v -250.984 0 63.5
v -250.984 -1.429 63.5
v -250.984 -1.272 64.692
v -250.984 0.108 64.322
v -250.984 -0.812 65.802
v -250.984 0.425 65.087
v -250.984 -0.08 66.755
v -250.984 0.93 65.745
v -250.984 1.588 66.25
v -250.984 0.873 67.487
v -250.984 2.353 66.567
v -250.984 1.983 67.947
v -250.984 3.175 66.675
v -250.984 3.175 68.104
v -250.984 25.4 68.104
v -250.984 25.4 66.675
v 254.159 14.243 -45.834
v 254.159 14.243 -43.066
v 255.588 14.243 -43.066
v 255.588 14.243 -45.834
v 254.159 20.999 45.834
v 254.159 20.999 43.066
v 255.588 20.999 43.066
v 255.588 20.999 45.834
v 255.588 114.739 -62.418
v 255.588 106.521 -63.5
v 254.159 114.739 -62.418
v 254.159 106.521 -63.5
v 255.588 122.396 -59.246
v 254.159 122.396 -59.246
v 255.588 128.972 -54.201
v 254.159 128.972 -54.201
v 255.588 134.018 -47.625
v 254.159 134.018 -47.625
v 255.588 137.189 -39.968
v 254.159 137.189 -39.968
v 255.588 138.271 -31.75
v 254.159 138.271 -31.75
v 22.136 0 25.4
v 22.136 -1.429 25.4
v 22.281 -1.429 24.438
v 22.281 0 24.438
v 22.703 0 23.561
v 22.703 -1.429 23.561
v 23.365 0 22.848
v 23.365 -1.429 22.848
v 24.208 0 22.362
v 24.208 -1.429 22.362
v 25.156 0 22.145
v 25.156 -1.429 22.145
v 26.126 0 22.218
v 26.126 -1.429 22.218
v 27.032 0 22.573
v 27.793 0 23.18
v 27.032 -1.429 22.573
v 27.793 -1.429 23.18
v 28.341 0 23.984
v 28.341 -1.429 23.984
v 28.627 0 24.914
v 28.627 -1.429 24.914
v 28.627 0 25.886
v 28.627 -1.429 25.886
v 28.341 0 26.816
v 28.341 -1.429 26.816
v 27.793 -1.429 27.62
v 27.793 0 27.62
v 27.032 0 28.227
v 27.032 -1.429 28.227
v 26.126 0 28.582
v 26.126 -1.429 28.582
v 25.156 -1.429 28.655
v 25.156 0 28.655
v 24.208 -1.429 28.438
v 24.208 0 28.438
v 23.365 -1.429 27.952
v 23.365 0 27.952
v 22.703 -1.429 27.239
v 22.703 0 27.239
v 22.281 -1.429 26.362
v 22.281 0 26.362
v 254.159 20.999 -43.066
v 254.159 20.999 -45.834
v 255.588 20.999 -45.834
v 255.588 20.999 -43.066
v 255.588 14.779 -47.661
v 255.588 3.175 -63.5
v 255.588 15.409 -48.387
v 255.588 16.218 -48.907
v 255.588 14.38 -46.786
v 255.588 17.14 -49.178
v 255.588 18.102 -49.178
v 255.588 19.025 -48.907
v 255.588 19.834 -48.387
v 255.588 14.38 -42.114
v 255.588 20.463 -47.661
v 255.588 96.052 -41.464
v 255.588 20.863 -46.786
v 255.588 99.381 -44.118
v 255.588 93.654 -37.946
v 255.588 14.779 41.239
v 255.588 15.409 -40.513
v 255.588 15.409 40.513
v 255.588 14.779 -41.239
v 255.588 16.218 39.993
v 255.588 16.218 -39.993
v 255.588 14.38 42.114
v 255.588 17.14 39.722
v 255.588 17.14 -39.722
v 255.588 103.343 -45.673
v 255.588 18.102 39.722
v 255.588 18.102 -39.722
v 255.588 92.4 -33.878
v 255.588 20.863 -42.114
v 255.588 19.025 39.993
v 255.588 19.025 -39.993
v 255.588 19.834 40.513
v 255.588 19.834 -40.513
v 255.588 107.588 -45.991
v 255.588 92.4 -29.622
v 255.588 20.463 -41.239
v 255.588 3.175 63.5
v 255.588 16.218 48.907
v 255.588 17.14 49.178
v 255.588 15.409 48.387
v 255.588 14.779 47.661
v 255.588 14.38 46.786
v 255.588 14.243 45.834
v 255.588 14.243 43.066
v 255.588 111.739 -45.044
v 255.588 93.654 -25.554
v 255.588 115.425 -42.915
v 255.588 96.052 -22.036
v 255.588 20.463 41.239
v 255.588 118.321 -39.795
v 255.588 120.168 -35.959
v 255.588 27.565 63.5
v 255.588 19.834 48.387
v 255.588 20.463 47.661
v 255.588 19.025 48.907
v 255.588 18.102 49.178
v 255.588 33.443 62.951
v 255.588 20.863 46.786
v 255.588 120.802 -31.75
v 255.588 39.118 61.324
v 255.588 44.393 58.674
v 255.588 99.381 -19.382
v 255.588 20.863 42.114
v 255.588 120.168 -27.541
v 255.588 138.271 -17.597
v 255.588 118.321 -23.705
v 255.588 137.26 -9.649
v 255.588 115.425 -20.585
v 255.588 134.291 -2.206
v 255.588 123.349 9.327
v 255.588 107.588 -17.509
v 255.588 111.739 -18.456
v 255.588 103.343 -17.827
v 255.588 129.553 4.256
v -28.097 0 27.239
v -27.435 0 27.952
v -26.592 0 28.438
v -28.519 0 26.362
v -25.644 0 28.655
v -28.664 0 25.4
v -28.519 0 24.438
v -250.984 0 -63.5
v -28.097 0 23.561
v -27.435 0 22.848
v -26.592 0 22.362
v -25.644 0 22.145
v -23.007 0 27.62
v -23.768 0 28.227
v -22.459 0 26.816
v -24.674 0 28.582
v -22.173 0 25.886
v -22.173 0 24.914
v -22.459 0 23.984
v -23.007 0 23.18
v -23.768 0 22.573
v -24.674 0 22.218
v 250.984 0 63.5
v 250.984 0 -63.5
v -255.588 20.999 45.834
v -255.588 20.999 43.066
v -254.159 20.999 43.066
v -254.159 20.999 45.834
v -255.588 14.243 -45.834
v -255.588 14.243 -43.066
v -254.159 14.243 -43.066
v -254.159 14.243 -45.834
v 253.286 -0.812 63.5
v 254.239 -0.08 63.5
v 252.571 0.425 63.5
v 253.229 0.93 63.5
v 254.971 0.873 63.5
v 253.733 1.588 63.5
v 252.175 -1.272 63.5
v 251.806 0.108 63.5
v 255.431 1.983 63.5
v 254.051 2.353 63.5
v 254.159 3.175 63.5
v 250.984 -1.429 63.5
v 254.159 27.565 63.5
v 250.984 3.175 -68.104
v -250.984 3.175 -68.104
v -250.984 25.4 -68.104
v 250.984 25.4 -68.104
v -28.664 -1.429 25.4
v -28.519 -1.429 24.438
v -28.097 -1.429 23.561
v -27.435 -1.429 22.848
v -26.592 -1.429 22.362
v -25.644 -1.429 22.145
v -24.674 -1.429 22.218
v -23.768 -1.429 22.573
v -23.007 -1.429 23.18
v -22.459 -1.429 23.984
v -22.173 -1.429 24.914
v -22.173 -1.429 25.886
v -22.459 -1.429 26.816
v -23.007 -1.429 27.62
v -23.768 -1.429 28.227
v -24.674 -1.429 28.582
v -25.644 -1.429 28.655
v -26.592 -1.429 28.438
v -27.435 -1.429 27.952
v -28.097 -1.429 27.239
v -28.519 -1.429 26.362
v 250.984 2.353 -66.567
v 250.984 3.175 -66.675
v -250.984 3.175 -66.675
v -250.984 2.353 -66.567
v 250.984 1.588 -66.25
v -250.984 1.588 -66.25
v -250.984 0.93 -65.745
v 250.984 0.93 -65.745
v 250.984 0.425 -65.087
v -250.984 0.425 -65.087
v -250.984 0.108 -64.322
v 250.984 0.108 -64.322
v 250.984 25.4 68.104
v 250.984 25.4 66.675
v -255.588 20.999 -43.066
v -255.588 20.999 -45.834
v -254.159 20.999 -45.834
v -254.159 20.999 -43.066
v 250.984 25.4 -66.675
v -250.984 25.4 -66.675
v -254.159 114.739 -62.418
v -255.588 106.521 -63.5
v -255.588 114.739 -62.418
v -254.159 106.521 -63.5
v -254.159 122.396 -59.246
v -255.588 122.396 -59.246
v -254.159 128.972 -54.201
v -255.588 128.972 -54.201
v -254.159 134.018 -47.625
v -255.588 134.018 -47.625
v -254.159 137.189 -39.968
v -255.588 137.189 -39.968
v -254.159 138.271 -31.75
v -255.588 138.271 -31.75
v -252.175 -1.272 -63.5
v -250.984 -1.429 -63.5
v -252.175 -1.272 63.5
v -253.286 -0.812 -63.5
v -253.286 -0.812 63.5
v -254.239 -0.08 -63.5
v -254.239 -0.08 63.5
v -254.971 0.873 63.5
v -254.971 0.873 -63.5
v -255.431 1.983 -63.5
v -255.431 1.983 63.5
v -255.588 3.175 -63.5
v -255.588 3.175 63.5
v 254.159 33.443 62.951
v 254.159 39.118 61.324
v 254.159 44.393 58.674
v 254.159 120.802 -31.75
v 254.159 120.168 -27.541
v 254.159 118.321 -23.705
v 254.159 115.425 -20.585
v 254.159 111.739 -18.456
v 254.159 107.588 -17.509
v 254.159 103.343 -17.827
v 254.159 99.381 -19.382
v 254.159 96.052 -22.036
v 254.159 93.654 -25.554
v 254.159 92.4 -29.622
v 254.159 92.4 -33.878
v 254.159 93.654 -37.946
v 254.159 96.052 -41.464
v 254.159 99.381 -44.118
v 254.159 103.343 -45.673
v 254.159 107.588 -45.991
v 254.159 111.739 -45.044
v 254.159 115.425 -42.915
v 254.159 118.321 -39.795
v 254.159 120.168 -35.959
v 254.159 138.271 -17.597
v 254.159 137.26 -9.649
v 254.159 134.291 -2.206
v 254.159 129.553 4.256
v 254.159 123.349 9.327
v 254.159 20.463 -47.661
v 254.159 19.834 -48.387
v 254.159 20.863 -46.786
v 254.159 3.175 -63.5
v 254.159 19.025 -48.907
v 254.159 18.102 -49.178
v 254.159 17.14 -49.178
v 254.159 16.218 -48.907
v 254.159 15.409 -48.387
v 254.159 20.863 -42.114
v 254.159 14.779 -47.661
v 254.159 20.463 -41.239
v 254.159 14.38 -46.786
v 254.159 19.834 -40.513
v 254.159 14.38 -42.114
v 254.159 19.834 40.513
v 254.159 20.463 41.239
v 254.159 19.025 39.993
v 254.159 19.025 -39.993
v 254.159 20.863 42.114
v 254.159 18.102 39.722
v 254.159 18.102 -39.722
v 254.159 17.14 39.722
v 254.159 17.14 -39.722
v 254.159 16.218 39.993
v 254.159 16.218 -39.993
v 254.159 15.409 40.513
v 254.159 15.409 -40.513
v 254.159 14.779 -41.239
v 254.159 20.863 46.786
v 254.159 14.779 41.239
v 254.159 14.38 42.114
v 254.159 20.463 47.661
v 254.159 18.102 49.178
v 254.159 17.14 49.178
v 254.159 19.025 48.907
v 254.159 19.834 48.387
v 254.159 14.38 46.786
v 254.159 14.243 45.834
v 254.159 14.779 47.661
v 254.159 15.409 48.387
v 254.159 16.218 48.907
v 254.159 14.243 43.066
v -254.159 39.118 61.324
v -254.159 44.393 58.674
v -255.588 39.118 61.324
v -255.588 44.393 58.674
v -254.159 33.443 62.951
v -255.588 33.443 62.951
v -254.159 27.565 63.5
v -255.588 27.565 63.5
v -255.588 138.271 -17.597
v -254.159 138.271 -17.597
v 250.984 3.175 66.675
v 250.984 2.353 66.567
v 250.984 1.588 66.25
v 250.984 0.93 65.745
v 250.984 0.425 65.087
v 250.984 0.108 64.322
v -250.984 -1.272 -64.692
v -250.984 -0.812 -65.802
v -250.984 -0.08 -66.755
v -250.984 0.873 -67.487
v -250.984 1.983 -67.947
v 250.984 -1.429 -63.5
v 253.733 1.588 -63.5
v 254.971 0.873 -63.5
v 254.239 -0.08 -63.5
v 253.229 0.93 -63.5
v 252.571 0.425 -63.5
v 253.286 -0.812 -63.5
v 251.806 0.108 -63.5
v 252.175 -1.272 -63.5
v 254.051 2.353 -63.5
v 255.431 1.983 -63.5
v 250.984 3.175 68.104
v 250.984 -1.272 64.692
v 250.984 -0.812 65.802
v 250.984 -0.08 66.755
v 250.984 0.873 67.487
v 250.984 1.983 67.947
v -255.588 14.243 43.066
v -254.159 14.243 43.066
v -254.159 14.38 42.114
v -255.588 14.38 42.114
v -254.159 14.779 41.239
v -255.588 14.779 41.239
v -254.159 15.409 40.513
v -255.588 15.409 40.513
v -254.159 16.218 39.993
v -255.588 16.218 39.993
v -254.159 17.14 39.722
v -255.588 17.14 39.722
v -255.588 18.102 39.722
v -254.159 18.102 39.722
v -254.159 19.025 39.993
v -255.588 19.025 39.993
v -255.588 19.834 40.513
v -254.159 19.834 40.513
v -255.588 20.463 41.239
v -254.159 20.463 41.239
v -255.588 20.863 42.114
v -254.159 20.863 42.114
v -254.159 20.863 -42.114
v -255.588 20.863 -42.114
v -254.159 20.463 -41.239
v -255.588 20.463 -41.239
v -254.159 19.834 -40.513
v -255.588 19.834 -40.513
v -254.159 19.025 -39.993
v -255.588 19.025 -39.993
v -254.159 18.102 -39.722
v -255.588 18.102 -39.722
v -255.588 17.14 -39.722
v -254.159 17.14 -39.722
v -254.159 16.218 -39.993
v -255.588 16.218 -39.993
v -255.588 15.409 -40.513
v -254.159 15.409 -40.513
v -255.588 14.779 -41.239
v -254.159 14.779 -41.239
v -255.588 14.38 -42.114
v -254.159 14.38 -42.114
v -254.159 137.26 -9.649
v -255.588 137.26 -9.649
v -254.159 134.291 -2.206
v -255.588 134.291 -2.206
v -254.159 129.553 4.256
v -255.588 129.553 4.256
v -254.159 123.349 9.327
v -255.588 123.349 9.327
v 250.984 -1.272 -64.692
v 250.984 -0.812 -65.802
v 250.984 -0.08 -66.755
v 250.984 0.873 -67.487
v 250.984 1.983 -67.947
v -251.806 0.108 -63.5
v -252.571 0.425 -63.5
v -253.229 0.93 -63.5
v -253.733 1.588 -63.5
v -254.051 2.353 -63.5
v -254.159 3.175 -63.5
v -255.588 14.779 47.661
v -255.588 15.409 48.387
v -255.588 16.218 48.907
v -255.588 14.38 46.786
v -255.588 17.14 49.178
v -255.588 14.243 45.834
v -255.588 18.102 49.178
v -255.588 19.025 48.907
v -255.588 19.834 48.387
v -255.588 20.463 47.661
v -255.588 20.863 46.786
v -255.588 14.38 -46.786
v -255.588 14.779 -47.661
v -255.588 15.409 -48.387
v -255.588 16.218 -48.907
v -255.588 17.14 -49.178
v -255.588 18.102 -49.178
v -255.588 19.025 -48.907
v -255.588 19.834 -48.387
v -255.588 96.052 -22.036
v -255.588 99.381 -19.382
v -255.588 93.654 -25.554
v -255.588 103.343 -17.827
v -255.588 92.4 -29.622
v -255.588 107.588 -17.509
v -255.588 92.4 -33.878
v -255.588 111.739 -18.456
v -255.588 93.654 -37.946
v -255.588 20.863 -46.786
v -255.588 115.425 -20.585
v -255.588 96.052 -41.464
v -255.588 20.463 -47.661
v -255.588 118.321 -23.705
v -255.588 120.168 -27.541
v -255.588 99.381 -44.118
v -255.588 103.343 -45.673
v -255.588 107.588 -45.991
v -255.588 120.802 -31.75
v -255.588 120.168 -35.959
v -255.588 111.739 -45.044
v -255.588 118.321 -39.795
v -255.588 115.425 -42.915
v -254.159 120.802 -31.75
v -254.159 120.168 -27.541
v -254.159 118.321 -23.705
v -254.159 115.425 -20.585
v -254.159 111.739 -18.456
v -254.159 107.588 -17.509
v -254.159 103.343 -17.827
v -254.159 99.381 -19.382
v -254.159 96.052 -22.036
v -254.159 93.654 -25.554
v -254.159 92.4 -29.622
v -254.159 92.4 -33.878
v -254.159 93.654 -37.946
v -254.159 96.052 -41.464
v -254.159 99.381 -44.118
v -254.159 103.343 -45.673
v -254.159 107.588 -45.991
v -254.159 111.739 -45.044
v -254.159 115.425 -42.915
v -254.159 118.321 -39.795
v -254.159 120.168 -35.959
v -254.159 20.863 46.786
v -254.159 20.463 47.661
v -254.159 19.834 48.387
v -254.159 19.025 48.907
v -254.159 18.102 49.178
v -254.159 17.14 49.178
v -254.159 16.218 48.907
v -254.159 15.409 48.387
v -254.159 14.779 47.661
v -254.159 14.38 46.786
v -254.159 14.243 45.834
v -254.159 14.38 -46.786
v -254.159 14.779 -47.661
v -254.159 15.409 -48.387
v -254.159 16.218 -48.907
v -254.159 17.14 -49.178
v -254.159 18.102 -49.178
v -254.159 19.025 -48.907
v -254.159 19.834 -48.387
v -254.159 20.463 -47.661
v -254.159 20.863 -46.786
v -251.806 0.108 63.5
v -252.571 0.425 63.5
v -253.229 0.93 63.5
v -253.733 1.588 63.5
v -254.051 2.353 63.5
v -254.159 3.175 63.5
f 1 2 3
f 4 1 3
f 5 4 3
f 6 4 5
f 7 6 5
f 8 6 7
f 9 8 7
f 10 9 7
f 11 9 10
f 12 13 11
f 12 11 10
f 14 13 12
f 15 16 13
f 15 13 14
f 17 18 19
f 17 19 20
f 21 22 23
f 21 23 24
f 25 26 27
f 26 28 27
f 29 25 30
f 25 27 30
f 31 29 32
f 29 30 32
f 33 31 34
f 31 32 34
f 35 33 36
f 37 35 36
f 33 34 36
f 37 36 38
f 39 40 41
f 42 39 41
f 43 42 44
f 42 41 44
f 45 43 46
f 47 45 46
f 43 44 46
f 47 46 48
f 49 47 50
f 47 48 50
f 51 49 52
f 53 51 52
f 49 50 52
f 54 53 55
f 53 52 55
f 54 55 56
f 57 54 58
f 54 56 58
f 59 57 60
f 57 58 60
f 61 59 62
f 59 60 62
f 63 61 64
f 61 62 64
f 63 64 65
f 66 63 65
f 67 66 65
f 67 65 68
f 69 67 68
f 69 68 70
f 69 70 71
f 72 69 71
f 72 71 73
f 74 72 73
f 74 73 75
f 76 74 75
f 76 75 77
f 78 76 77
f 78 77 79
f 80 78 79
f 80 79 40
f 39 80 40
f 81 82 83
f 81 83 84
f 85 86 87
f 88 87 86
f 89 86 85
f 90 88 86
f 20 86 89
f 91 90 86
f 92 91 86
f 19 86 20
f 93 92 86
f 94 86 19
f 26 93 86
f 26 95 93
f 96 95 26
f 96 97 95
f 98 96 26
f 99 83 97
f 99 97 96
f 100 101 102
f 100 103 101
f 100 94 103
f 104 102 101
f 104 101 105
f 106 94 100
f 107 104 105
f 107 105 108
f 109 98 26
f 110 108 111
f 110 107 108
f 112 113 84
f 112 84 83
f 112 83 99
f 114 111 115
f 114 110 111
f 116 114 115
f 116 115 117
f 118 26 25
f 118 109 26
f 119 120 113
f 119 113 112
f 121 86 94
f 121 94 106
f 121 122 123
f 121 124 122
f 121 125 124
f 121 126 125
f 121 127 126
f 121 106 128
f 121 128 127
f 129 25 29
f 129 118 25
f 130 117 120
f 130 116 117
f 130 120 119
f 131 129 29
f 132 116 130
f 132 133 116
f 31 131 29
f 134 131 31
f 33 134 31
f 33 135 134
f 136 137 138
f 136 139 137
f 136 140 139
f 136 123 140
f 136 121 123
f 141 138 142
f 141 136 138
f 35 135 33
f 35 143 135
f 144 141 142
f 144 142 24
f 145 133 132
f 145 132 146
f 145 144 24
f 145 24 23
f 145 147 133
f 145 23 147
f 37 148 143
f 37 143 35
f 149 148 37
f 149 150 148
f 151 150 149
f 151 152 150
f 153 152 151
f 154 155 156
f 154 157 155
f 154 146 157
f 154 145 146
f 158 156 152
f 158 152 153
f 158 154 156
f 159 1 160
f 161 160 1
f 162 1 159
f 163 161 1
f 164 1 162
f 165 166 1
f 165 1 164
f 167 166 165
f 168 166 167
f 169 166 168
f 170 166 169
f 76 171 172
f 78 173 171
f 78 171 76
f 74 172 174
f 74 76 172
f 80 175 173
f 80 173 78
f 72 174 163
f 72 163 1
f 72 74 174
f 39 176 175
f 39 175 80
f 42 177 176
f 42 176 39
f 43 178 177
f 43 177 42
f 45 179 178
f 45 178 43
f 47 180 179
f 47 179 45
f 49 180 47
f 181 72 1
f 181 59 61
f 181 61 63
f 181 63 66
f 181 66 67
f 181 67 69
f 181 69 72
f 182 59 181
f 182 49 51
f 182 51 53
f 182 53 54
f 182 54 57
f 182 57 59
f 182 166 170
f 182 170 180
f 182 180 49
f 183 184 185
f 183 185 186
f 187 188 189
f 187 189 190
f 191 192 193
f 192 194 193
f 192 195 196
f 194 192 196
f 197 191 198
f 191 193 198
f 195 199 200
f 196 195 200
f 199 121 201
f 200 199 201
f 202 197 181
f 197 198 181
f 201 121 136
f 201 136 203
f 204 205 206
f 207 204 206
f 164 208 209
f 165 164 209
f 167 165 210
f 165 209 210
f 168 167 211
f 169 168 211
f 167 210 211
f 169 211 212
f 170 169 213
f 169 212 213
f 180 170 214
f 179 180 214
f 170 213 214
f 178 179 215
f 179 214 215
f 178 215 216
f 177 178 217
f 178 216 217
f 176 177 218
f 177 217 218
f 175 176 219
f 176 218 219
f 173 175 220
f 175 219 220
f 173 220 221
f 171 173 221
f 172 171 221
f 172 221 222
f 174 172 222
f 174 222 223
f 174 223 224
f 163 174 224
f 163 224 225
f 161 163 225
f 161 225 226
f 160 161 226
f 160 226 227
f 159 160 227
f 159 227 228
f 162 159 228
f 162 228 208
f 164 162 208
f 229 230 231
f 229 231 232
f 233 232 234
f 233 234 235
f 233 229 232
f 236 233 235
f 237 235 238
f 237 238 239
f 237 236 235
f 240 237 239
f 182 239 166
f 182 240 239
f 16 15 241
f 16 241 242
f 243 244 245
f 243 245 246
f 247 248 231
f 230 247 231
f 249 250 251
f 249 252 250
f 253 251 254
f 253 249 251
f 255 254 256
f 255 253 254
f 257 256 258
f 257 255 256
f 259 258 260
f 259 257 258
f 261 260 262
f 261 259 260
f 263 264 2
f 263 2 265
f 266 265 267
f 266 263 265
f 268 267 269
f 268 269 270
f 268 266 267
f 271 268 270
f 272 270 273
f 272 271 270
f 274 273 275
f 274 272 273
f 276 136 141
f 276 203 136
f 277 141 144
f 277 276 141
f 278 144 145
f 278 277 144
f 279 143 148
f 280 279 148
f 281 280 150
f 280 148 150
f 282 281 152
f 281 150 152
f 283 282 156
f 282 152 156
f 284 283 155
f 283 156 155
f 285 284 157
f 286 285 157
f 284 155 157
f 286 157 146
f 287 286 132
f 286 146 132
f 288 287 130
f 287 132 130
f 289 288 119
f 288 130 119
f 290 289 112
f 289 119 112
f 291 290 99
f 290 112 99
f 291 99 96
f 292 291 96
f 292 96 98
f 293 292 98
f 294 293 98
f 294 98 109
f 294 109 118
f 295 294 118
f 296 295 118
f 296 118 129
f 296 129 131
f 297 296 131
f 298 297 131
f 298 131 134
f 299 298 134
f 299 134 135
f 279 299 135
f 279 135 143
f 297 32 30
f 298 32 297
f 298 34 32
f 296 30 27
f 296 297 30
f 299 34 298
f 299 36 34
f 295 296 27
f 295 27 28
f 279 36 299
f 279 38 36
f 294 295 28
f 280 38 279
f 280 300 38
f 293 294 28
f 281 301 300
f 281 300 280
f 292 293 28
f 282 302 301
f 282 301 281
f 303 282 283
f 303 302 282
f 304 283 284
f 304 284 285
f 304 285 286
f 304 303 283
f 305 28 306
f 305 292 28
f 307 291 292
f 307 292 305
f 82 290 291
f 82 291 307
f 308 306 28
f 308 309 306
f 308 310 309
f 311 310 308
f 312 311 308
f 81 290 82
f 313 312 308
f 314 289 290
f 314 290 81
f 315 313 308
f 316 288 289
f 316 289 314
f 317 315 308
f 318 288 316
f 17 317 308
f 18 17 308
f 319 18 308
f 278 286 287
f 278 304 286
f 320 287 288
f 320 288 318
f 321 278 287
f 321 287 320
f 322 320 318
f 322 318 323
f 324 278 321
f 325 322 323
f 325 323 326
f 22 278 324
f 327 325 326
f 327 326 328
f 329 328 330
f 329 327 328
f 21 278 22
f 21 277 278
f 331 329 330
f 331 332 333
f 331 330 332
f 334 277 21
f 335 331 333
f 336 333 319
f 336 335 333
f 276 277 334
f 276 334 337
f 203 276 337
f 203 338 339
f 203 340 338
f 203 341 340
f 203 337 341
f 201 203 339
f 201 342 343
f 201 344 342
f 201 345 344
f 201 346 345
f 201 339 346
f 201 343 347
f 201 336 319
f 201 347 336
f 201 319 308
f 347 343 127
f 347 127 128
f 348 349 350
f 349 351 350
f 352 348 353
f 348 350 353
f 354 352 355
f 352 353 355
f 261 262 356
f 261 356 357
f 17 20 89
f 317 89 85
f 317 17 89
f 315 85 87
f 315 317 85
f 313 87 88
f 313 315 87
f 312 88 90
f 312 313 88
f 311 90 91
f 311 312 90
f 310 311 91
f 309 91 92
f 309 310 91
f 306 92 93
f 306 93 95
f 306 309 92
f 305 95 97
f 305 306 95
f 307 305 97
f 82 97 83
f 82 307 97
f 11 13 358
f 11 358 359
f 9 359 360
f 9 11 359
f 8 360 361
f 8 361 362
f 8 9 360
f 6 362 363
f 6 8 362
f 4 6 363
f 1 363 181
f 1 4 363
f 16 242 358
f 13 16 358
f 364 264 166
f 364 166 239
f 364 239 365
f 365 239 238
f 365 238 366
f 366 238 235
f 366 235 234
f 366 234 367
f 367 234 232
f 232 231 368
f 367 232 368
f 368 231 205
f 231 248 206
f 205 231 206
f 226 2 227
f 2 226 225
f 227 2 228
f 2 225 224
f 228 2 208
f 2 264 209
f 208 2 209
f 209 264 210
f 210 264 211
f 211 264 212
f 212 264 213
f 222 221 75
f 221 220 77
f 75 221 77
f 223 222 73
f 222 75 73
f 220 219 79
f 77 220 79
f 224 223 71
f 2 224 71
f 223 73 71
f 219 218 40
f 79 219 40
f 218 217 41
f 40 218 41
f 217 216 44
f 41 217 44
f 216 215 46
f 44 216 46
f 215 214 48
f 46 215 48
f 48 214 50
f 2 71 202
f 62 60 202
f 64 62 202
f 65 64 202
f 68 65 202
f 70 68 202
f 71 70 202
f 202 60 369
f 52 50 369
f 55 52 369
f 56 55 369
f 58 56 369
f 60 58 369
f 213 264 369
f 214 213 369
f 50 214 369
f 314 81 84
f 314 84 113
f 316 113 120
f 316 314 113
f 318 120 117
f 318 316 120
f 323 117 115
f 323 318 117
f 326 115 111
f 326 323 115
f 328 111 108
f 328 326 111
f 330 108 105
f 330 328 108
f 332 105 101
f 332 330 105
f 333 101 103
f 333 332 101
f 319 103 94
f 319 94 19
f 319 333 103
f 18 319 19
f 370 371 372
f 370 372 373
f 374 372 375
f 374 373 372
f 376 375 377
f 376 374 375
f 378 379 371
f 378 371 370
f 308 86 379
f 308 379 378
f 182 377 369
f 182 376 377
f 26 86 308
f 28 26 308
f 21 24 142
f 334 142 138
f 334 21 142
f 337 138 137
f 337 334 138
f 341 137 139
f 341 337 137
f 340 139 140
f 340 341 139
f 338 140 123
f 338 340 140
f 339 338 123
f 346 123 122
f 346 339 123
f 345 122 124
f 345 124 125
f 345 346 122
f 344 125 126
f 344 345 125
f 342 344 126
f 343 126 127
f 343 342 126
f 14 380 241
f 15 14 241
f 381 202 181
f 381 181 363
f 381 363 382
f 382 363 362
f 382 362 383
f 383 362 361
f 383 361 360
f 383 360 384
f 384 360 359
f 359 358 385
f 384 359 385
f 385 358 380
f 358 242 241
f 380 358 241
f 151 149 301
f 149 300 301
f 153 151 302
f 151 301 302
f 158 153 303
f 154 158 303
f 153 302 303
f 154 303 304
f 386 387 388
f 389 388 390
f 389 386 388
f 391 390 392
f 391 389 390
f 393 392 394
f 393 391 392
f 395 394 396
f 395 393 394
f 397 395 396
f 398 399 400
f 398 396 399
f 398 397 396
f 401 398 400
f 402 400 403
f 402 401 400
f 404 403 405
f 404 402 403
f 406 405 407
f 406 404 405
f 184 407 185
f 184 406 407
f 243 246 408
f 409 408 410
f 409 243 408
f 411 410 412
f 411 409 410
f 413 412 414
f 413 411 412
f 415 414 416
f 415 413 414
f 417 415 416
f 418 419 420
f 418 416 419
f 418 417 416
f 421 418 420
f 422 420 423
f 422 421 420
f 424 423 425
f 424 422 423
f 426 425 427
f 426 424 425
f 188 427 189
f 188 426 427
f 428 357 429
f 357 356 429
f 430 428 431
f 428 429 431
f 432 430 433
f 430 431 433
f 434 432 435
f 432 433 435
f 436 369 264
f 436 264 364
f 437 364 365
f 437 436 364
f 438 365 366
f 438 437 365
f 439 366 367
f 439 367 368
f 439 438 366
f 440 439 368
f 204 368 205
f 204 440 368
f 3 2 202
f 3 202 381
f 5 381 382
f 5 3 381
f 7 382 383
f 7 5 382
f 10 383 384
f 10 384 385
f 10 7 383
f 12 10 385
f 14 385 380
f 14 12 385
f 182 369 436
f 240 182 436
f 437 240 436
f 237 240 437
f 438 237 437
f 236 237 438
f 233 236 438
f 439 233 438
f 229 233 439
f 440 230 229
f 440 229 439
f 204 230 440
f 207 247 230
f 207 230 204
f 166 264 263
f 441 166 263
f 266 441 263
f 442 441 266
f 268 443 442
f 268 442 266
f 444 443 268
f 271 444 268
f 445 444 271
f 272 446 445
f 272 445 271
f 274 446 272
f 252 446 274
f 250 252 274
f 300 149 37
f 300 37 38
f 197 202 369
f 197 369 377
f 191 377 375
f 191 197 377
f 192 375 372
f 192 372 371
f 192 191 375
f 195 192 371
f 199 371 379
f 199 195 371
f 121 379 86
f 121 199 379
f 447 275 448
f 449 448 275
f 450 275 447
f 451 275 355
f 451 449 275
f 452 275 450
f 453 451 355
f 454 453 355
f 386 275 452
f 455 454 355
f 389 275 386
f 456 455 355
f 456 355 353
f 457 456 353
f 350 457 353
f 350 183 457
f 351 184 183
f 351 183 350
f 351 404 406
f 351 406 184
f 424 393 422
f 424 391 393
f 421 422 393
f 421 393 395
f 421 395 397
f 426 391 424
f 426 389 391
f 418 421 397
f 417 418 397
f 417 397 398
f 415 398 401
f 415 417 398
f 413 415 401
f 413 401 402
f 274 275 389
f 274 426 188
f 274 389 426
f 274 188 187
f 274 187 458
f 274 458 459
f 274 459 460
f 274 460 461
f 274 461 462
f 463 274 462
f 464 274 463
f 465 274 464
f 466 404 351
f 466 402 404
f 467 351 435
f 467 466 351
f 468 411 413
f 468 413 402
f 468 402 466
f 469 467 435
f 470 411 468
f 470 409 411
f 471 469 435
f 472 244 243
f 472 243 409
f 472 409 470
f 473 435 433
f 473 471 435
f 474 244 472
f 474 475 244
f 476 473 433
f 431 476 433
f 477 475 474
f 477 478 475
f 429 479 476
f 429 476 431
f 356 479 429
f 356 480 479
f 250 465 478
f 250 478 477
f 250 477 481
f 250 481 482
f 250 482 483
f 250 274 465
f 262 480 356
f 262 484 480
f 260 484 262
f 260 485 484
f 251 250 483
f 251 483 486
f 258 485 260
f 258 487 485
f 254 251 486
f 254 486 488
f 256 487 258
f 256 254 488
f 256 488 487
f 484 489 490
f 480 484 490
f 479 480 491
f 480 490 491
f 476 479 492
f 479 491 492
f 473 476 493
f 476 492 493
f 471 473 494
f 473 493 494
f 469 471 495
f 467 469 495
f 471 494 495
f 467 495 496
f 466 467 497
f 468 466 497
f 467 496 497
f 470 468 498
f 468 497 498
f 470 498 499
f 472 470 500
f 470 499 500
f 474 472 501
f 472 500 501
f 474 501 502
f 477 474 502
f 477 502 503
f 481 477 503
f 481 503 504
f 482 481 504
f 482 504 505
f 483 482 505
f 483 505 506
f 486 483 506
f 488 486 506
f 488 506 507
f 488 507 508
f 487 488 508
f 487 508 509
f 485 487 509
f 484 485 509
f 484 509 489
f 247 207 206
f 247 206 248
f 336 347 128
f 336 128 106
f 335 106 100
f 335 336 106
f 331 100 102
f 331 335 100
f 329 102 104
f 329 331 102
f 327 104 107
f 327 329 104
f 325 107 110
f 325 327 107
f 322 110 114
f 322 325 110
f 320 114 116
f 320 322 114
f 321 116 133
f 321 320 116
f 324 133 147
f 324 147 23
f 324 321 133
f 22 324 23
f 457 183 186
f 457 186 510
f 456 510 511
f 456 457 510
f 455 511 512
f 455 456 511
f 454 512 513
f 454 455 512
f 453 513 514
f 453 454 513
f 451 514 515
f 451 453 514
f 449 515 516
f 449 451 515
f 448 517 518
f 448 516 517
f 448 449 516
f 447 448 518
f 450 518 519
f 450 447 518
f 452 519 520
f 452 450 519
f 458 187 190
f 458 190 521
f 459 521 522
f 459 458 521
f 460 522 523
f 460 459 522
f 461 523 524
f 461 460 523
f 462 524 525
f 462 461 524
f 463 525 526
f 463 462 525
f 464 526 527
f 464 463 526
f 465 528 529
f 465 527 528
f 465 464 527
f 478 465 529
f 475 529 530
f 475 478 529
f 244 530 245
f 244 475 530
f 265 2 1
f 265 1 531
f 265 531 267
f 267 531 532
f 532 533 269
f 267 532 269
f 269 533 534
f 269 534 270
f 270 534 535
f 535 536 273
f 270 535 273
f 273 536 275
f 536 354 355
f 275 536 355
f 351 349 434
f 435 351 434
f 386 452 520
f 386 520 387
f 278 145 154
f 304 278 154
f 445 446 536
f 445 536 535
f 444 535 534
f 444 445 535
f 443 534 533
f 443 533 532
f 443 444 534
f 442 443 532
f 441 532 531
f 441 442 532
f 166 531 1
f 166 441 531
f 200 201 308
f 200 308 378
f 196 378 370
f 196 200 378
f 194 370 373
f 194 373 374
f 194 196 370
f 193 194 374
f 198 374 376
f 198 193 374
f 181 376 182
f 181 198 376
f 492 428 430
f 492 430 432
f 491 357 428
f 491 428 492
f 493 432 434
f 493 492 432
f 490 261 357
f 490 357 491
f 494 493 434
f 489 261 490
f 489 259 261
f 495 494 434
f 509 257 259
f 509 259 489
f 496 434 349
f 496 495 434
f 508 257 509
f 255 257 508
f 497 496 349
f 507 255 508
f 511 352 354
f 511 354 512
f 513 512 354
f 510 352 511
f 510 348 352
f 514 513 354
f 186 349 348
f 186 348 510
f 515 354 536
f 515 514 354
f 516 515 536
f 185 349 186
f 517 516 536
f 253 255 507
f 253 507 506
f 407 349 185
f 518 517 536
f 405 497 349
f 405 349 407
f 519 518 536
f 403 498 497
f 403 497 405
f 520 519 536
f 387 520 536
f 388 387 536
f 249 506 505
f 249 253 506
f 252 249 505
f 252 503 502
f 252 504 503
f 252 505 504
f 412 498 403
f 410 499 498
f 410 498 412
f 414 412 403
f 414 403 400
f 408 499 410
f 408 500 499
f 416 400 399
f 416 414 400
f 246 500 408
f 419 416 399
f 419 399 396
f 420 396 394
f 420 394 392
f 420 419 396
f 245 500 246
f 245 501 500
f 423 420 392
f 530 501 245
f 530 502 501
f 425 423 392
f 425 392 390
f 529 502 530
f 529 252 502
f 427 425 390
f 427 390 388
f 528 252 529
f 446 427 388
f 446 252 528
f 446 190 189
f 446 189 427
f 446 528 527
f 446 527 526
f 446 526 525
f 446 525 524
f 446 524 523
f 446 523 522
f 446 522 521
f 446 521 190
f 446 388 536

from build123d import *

# Parameters (mm, degrees)
SKETCH1_W                      = 511.175
SKETCH1_H                      = 127
BASE_FLANGE1_DEPTH             = 1.42875
EDGE_FLANGE1_STRIP_W           = 12.065
EDGE_FLANGE1_STRIP_H           = 1.42875
EDGE_FLANGE1_STRIP_CUT_DEPTH   = 127
EDGE_FLANGE1_STRIP_2_W         = 12.065
EDGE_FLANGE1_STRIP_2_H         = 1.42875
EDGE_FLANGE1_STRIP_CUT_2_DEPTH = 127
EDGE_FLANGE1_DEPTH             = 127
EDGE_FLANGE1_BEND_DEPTH        = 127
CUT_EXTRUDE1_DEPTH             = 534.339544007
FILLET1_R                      = 31.75
SKETCH14_R                     = 14.28115
CUT_EXTRUDE2_DEPTH             = 534.339544007
H_START                        = -255.5875
H_0_266_DIAMETER_SLOT1_DEPTH   = 511.175
F_0_257_DIAMETER_HOLE2_D       = 6.5278
EDGE_FLANGE2_DEPTH             = 501.9675
EDGE_FLANGE2_BEND_DEPTH        = 501.9675


# Read off the part's stored shape, not the designer's step: H (0.266) Diameter Slot1
# Sheet-metal steps are written as plain solids
with BuildPart() as part:
    # Sketch1 → Base-Flange1 (new body)
    with BuildSketch(Plane(origin=(0, 0, 0), x_dir=(1, 0, 0), z_dir=(0, 1, 0))):
        Rectangle(SKETCH1_W, SKETCH1_H)
    extrude(amount=-BASE_FLANGE1_DEPTH)

    # Edge-Flange1 strip (across the edge) → Edge-Flange1 strip cut (cut)
    with BuildSketch(Plane(origin=(255.5875, 0, 63.5), x_dir=(-1, 0, 0), z_dir=(0, 0, -1))):
        with Locations((-1.42875, -0.714375)):
            Rectangle(EDGE_FLANGE1_STRIP_W, EDGE_FLANGE1_STRIP_H)
    extrude(amount=EDGE_FLANGE1_STRIP_CUT_DEPTH, mode=Mode.SUBTRACT)

    # Edge-Flange1 strip 2 (across the edge) → Edge-Flange1 strip cut 2 (cut)
    with BuildSketch(Plane(origin=(-255.5875, 0, -63.5), x_dir=(1, 0, 0), z_dir=(0, 0, 1))):
        with Locations((-1.42875, -0.714375)):
            Rectangle(EDGE_FLANGE1_STRIP_2_W, EDGE_FLANGE1_STRIP_2_H)
    extrude(amount=EDGE_FLANGE1_STRIP_CUT_2_DEPTH, mode=Mode.SUBTRACT)

    # Edge-Flange1 section (across the edge) → Edge-Flange1 (add)
    with BuildSketch(Plane(origin=(255.5875, 0, 63.5), x_dir=(-1, 0, 0), z_dir=(0, 0, -1))):
        with BuildLine():
            Line((0, 3.175), (0, 138.27125))
            Line((0, 138.27125), (1.42875, 138.27125))
            Line((1.42875, 138.27125), (1.42875, 3.175))
            ThreePointArc((1.42875, 3.175), (2.35868597, 0.92993597), (4.60375, 0))
            Line((4.60375, 0), (4.60375, -1.42875))
            ThreePointArc((4.60375, -1.42875), (1.348407156, -0.080342844), (0, 3.175))
        make_face()
    extrude(amount=EDGE_FLANGE1_DEPTH)

    # Edge-Flange1 section 2 (across the edge) → Edge-Flange1 bend (add)
    with BuildSketch(Plane(origin=(-255.5875, 0, -63.5), x_dir=(1, 0, 0), z_dir=(0, 0, 1))):
        with BuildLine():
            Line((0, 3.175), (0, 138.27125))
            Line((0, 138.27125), (1.42875, 138.27125))
            Line((1.42875, 138.27125), (1.42875, 3.175))
            ThreePointArc((1.42875, 3.175), (2.35868597, 0.92993597), (4.60375, 0))
            Line((4.60375, 0), (4.60375, -1.42875))
            ThreePointArc((4.60375, -1.42875), (1.348407156, -0.080342844), (0, 3.175))
        make_face()
    extrude(amount=EDGE_FLANGE1_BEND_DEPTH)

    # Sketch13 → Cut-Extrude1 (cut, through all)
    with BuildSketch(Plane(origin=(255.5875, 0, 0), x_dir=(0, 0, -1), z_dir=(1, 0, 0))):
        Polygon((-63.5, 36.67125), (0, 138.27125), (-63.5, 138.27125), align=None)
    extrude(amount=-CUT_EXTRUDE1_DEPTH, mode=Mode.SUBTRACT)

    # Fillet1
    fillet1_edges = [part.edges().sort_by_distance(p)[0] for p in [
        (254.873125, 138.27125, -63.5),
        (-254.873125, 138.27125, -63.5),
        (254.873125, 138.27125, 0),
        (254.873125, 36.67125, 63.5),
        (-254.873125, 138.27125, 0),
        (-254.873125, 36.67125, 63.5),
    ]]
    fillet(fillet1_edges, radius=FILLET1_R)

    # Sketch14 → Cut-Extrude2 (cut, through all)
    with BuildSketch(Plane(origin=(255.5875, 0, 0), x_dir=(0, 0, -1), z_dir=(1, 0, 0))):
        with Locations(Location((31.75, 106.52125, 0), (0, 0, 90))):
            Circle(SKETCH14_R)
    extrude(amount=-CUT_EXTRUDE2_DEPTH, mode=Mode.SUBTRACT)

    # H (0.266) Diameter Slot1 outline → H (0.266) Diameter Slot1 (cut)
    with BuildSketch(Plane.YZ.offset(H_START)):
        with BuildLine():
            ThreePointArc((20.99945, -43.0657), (17.62125, -39.6875), (14.24305, -43.0657))
            Line((14.24305, -43.0657), (14.24305, -45.8343))
            ThreePointArc((14.24305, -45.8343), (17.62125, -49.2125), (20.99945, -45.8343))
            Line((20.99945, -45.8343), (20.99945, -43.0657))
        make_face()
        with BuildLine():
            ThreePointArc((20.99945, 45.8343), (17.62125, 49.2125), (14.24305, 45.8343))
            Line((14.24305, 45.8343), (14.24305, 43.0657))
            ThreePointArc((14.24305, 43.0657), (17.62125, 39.6875), (20.99945, 43.0657))
            Line((20.99945, 43.0657), (20.99945, 45.8343))
        make_face()
    extrude(amount=H_0_266_DIAMETER_SLOT1_DEPTH, mode=Mode.SUBTRACT)

    # F (0.257) Diameter Hole2 (through all)
    with Locations(Plane(origin=(0, 0, 0), x_dir=(1, 0, 0), z_dir=(0, 1, 0))):
        with Locations((-25.4, -25.4), (25.4, -25.4)):
            Hole(F_0_257_DIAMETER_HOLE2_D / 2)

    # Edge-Flange2 section (across the edge) → Edge-Flange2 (add)
    with BuildSketch(Plane(origin=(-250.98375, 0, 66.675), x_dir=(0, 0, -1), z_dir=(1, 0, 0))):
        with BuildLine():
            Line((-1.42875, 3.175), (-1.42875, 25.4))
            Line((-1.42875, 25.4), (0, 25.4))
            Line((0, 25.4), (0, 3.175))
            ThreePointArc((0, 3.175), (0.92993597, 0.92993597), (3.175, 0))
            Line((3.175, 0), (3.175, -1.42875))
            ThreePointArc((3.175, -1.42875), (-0.080342844, -0.080342844), (-1.42875, 3.175))
        make_face()
    extrude(amount=EDGE_FLANGE2_DEPTH)

    # Edge-Flange2 section 2 (across the edge) → Edge-Flange2 bend (add)
    with BuildSketch(Plane(origin=(250.98375, 0, -66.675), x_dir=(0, 0, 1), z_dir=(-1, 0, 0))):
        with BuildLine():
            Line((-1.42875, 3.175), (-1.42875, 25.4))
            Line((-1.42875, 25.4), (0, 25.4))
            Line((0, 25.4), (0, 3.175))
            ThreePointArc((0, 3.175), (0.92993597, 0.92993597), (3.175, 0))
            Line((3.175, 0), (3.175, -1.42875))
            ThreePointArc((3.175, -1.42875), (-0.080342844, -0.080342844), (-1.42875, 3.175))
        make_face()
    extrude(amount=EDGE_FLANGE2_BEND_DEPTH)


solid = part.part
